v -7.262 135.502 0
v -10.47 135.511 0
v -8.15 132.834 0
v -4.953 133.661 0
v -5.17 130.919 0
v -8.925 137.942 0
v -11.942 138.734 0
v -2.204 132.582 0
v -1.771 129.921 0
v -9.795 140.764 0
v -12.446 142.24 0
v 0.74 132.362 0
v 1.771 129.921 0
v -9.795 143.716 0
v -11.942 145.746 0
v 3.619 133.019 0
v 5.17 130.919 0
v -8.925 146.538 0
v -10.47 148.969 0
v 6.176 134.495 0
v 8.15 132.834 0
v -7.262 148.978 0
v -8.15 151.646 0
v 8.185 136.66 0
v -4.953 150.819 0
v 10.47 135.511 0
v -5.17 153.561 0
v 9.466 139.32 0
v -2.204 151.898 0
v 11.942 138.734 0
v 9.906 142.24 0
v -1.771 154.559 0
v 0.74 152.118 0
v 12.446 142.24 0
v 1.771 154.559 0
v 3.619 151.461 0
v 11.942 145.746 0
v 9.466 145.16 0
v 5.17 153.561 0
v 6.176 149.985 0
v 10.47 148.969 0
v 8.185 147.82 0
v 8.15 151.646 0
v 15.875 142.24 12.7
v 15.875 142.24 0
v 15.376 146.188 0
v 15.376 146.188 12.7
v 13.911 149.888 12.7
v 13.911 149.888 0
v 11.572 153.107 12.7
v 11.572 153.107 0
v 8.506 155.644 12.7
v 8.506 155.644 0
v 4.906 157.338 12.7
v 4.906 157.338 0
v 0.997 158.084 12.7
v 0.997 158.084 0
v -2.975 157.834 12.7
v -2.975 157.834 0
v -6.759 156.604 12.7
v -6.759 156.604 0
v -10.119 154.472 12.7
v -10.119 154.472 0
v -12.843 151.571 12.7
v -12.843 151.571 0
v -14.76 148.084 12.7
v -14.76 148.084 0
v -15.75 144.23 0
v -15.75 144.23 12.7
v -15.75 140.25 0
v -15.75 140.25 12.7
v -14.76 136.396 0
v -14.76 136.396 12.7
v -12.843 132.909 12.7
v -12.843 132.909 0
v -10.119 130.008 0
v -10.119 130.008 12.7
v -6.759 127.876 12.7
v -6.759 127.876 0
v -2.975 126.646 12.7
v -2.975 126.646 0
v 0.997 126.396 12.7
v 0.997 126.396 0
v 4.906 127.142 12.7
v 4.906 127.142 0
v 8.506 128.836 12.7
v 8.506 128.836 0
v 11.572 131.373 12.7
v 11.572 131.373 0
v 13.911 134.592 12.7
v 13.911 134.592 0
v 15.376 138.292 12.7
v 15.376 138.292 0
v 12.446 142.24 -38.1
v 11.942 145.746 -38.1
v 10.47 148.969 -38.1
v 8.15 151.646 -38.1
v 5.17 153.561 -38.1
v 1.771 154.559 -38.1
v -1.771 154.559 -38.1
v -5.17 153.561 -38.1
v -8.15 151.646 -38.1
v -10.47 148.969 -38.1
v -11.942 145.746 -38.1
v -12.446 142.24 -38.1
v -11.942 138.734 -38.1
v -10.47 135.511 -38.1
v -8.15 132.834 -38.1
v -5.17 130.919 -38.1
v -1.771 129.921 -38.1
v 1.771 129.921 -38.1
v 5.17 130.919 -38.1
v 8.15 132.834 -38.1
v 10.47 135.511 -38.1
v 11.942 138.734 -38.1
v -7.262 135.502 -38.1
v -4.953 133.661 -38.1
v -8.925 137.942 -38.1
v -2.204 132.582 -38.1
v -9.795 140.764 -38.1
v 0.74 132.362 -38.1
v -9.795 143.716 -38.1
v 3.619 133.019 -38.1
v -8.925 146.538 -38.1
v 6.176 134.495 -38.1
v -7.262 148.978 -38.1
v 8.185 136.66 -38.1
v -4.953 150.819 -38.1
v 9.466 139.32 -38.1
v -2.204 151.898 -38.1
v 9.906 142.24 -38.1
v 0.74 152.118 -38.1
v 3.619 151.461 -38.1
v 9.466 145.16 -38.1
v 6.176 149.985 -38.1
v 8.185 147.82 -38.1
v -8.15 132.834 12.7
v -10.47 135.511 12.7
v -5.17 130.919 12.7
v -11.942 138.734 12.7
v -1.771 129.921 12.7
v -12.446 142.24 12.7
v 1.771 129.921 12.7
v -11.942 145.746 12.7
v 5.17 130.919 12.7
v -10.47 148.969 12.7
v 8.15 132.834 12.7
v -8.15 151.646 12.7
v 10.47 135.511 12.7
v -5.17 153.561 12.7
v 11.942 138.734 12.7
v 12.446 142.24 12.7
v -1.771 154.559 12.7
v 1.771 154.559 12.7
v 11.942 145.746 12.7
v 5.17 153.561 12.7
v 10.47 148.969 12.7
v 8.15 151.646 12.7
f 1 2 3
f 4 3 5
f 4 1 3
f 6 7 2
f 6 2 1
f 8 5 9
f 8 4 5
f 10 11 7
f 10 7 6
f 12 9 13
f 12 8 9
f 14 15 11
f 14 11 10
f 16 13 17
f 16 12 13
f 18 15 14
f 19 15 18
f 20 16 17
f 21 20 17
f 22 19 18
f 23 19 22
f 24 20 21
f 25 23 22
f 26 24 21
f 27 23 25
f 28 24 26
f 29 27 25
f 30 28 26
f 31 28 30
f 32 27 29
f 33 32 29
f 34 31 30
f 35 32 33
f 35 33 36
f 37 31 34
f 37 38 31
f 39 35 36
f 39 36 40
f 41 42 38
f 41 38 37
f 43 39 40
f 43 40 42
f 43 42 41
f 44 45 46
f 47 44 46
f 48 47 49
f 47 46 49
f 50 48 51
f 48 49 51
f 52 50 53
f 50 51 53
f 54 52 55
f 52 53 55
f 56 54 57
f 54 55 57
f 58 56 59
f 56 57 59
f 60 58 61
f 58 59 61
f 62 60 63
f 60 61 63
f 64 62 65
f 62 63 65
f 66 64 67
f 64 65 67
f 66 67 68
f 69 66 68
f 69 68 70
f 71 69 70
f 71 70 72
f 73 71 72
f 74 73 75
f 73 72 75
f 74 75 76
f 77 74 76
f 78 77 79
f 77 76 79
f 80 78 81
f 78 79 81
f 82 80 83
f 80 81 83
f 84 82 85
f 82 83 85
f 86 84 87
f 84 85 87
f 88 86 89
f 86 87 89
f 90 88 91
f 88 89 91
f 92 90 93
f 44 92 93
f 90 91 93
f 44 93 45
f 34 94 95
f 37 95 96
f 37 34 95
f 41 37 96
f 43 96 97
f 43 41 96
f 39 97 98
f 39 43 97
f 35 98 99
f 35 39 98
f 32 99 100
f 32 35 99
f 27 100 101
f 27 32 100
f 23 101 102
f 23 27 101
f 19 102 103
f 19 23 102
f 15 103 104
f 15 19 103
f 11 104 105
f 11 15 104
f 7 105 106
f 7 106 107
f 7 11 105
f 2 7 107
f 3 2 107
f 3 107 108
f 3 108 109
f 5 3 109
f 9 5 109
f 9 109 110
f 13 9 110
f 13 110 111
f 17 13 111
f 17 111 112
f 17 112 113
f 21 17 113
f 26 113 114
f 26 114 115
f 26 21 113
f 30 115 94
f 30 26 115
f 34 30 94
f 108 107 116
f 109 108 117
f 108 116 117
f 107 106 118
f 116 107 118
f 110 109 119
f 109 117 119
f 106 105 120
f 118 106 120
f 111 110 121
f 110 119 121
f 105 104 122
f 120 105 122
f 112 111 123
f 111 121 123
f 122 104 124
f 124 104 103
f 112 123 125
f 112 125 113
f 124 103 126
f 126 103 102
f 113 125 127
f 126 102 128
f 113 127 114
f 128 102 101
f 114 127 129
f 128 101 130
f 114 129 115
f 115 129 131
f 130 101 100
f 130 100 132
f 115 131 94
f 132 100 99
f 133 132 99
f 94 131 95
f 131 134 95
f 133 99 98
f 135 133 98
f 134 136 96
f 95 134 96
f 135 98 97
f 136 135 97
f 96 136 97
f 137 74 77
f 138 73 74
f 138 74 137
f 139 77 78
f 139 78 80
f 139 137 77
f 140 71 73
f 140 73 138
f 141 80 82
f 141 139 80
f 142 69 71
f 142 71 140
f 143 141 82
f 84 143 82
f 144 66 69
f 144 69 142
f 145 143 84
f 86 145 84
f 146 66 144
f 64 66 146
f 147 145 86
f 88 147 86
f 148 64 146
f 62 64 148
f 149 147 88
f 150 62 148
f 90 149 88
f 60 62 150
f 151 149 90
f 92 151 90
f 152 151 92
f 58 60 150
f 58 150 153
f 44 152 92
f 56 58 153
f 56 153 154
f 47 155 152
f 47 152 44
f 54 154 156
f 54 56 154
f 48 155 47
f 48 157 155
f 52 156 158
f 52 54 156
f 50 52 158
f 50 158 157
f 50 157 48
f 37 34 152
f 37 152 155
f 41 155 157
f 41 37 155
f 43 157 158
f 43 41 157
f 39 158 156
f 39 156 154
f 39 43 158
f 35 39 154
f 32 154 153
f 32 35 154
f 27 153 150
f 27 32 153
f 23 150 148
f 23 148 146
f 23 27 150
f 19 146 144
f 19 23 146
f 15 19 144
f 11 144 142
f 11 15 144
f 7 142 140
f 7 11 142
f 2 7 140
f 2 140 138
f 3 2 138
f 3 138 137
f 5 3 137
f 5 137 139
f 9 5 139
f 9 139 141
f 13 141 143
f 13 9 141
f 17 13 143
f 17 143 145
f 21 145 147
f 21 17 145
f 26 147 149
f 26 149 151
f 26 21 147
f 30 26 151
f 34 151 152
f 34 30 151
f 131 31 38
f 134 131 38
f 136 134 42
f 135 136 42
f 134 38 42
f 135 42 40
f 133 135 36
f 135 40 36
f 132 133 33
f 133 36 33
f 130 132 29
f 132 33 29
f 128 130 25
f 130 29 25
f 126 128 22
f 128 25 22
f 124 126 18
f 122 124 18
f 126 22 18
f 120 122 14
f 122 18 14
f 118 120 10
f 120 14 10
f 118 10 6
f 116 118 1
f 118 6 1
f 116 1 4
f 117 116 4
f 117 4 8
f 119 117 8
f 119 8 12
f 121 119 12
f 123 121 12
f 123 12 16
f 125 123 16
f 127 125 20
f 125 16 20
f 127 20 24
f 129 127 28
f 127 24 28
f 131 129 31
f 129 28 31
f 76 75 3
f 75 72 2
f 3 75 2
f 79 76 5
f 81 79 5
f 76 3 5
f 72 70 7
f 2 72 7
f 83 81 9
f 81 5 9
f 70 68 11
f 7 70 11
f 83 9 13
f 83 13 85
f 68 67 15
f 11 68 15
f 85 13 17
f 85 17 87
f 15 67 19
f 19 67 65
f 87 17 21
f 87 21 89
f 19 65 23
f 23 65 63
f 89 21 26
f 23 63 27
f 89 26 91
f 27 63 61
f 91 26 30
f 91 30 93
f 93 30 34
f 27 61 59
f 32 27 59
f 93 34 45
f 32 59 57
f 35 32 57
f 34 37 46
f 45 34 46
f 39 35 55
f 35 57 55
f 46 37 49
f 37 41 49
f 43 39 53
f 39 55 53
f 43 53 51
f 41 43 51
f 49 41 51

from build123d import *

# Parameters (mm, degrees)
SKETCH1_R           = 12.446
SKETCH1_R_2         = 9.906
EXTRUDE_THIN1_DEPTH = 38.1
SKETCH1_3_R         = 15.875
SKETCH1_3_R_2       = 12.446
EXTRUDE1_DEPTH      = 12.7


with BuildPart() as part:
    # Sketch1 → Extrude-Thin1 (new body)
    with BuildSketch(Plane.XY):
        with Locations((0, 142.24)):
            Circle(SKETCH1_R)
        with Locations((0, 142.24)):
            Circle(SKETCH1_R_2, mode=Mode.SUBTRACT)
    extrude(amount=-EXTRUDE_THIN1_DEPTH)


with BuildPart() as body_2:
    # Sketch1_3 → Extrude1 (new body)
    with BuildSketch(Plane.XY):
        with Locations((0, 142.24)):
            Circle(SKETCH1_3_R)
        with Locations((0, 142.24)):
            Circle(SKETCH1_3_R_2, mode=Mode.SUBTRACT)
    extrude(amount=EXTRUDE1_DEPTH)


solid = Compound([part.part, body_2.part])
